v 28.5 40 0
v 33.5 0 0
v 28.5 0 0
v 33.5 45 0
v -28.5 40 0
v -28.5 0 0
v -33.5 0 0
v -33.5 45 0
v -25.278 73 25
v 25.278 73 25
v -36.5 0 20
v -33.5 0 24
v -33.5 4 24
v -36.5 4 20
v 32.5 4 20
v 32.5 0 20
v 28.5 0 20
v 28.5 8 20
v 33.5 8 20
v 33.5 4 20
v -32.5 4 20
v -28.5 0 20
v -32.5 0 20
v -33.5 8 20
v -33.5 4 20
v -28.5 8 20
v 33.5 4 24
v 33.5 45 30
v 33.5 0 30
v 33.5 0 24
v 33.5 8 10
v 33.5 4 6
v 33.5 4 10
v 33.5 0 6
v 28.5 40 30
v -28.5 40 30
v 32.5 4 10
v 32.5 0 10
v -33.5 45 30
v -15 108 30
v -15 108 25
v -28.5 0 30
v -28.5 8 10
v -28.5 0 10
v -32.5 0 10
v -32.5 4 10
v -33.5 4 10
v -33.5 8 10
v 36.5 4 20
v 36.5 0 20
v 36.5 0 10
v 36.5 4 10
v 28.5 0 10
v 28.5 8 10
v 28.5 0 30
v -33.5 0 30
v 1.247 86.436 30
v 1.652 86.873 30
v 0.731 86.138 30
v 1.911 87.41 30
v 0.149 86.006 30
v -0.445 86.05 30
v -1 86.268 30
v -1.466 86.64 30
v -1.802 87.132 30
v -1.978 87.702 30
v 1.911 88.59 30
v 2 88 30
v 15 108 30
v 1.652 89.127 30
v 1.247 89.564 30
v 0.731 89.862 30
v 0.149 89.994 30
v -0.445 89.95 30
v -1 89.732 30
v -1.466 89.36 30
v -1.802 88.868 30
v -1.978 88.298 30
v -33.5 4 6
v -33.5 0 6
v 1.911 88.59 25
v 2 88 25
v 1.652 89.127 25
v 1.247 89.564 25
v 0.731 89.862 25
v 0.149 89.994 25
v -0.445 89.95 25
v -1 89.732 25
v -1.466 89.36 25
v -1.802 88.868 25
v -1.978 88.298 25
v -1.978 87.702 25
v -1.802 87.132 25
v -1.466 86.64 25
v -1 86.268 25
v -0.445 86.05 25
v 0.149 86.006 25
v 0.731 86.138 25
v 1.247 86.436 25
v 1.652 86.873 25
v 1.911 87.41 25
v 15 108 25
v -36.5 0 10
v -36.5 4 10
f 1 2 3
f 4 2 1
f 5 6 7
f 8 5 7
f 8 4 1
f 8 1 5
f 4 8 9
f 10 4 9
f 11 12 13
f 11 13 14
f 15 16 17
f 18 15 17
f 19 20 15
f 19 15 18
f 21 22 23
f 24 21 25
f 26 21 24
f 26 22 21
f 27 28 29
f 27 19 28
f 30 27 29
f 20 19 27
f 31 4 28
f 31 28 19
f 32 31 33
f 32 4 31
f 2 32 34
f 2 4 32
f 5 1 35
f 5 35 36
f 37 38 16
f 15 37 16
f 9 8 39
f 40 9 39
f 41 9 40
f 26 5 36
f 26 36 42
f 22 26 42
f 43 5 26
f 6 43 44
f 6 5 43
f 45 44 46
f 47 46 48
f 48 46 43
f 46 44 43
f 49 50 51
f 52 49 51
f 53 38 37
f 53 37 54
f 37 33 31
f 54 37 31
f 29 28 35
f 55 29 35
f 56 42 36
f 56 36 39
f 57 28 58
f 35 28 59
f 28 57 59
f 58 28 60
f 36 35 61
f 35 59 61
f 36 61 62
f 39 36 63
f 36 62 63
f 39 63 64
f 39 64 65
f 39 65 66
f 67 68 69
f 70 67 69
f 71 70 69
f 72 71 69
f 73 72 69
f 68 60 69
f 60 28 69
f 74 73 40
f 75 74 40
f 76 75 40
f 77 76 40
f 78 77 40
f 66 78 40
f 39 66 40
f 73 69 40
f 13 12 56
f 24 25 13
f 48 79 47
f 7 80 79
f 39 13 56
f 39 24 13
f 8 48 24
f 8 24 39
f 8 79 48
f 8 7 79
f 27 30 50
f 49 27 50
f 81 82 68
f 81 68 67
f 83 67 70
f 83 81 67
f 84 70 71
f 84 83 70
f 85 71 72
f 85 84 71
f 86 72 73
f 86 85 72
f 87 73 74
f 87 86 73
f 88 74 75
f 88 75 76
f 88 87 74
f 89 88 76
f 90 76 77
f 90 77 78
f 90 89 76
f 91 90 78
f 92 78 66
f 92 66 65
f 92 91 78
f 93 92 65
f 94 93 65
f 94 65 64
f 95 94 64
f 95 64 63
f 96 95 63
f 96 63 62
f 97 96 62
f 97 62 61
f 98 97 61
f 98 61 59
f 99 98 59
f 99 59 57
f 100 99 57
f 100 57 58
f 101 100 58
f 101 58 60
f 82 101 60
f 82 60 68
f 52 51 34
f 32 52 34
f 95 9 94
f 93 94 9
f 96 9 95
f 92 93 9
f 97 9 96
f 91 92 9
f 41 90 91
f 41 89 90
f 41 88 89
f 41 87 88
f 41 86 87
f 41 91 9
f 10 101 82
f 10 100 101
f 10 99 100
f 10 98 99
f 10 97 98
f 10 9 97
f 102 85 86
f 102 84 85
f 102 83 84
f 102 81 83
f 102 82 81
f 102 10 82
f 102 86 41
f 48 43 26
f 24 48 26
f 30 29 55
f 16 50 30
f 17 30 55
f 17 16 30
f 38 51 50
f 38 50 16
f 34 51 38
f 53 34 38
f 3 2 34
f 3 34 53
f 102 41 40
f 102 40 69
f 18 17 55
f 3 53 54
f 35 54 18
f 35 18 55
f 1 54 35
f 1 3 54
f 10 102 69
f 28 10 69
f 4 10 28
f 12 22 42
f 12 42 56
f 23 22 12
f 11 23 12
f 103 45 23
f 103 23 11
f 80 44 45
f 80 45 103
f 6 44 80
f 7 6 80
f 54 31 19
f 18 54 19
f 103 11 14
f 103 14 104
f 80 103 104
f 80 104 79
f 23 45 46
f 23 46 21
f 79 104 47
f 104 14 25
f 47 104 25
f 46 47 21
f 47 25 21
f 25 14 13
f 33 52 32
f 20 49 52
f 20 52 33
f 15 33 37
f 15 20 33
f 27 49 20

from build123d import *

# Parameters (mm, degrees)
SKETCH_R     = 2
PAD_DEPTH    = 30
SKETCH001_W  = 8
SKETCH001_H  = 10
POCKET_DEPTH = 67.001
PAD001_DEPTH = 4


with BuildPart() as part:
    # Sketch → Pad (new body)
    with BuildSketch(Plane.XY):
        Polygon((-33.5, 0), (-33.5, 45), (-15, 108), (15, 108), (33.5, 45), (33.5, 0), (28.5, 0), (28.5, 40), (-28.5, 40), (-28.5, 0), align=None)
        with Locations((0, 88)):
            Circle(SKETCH_R, mode=Mode.SUBTRACT)
    extrude(amount=PAD_DEPTH)

    # Sketch001 (on Face1 of Pad) → Pocket (cut, through all)
    with BuildSketch(Plane.YZ.offset(33.5)):
        Polygon((45, 0), (73, 25), (108, 25), (108, 0), align=None)
        with Locations((4, 15)):
            Rectangle(SKETCH001_W, SKETCH001_H)
    extrude(amount=-POCKET_DEPTH, mode=Mode.SUBTRACT)

    # Sketch002 (on Face3 of Pocket) → Pad001 (join)
    with BuildSketch(Plane.XZ):
        Polygon((32.5, 20), (33.5, 24), (36.5, 20), (36.5, 10), (33.5, 6), (32.5, 10), align=None)
        Polygon((-32.5, 20), (-33.5, 24), (-36.5, 20), (-36.5, 10), (-33.5, 6), (-32.5, 10), align=None)
    extrude(amount=-PAD001_DEPTH)


solid = part.part
